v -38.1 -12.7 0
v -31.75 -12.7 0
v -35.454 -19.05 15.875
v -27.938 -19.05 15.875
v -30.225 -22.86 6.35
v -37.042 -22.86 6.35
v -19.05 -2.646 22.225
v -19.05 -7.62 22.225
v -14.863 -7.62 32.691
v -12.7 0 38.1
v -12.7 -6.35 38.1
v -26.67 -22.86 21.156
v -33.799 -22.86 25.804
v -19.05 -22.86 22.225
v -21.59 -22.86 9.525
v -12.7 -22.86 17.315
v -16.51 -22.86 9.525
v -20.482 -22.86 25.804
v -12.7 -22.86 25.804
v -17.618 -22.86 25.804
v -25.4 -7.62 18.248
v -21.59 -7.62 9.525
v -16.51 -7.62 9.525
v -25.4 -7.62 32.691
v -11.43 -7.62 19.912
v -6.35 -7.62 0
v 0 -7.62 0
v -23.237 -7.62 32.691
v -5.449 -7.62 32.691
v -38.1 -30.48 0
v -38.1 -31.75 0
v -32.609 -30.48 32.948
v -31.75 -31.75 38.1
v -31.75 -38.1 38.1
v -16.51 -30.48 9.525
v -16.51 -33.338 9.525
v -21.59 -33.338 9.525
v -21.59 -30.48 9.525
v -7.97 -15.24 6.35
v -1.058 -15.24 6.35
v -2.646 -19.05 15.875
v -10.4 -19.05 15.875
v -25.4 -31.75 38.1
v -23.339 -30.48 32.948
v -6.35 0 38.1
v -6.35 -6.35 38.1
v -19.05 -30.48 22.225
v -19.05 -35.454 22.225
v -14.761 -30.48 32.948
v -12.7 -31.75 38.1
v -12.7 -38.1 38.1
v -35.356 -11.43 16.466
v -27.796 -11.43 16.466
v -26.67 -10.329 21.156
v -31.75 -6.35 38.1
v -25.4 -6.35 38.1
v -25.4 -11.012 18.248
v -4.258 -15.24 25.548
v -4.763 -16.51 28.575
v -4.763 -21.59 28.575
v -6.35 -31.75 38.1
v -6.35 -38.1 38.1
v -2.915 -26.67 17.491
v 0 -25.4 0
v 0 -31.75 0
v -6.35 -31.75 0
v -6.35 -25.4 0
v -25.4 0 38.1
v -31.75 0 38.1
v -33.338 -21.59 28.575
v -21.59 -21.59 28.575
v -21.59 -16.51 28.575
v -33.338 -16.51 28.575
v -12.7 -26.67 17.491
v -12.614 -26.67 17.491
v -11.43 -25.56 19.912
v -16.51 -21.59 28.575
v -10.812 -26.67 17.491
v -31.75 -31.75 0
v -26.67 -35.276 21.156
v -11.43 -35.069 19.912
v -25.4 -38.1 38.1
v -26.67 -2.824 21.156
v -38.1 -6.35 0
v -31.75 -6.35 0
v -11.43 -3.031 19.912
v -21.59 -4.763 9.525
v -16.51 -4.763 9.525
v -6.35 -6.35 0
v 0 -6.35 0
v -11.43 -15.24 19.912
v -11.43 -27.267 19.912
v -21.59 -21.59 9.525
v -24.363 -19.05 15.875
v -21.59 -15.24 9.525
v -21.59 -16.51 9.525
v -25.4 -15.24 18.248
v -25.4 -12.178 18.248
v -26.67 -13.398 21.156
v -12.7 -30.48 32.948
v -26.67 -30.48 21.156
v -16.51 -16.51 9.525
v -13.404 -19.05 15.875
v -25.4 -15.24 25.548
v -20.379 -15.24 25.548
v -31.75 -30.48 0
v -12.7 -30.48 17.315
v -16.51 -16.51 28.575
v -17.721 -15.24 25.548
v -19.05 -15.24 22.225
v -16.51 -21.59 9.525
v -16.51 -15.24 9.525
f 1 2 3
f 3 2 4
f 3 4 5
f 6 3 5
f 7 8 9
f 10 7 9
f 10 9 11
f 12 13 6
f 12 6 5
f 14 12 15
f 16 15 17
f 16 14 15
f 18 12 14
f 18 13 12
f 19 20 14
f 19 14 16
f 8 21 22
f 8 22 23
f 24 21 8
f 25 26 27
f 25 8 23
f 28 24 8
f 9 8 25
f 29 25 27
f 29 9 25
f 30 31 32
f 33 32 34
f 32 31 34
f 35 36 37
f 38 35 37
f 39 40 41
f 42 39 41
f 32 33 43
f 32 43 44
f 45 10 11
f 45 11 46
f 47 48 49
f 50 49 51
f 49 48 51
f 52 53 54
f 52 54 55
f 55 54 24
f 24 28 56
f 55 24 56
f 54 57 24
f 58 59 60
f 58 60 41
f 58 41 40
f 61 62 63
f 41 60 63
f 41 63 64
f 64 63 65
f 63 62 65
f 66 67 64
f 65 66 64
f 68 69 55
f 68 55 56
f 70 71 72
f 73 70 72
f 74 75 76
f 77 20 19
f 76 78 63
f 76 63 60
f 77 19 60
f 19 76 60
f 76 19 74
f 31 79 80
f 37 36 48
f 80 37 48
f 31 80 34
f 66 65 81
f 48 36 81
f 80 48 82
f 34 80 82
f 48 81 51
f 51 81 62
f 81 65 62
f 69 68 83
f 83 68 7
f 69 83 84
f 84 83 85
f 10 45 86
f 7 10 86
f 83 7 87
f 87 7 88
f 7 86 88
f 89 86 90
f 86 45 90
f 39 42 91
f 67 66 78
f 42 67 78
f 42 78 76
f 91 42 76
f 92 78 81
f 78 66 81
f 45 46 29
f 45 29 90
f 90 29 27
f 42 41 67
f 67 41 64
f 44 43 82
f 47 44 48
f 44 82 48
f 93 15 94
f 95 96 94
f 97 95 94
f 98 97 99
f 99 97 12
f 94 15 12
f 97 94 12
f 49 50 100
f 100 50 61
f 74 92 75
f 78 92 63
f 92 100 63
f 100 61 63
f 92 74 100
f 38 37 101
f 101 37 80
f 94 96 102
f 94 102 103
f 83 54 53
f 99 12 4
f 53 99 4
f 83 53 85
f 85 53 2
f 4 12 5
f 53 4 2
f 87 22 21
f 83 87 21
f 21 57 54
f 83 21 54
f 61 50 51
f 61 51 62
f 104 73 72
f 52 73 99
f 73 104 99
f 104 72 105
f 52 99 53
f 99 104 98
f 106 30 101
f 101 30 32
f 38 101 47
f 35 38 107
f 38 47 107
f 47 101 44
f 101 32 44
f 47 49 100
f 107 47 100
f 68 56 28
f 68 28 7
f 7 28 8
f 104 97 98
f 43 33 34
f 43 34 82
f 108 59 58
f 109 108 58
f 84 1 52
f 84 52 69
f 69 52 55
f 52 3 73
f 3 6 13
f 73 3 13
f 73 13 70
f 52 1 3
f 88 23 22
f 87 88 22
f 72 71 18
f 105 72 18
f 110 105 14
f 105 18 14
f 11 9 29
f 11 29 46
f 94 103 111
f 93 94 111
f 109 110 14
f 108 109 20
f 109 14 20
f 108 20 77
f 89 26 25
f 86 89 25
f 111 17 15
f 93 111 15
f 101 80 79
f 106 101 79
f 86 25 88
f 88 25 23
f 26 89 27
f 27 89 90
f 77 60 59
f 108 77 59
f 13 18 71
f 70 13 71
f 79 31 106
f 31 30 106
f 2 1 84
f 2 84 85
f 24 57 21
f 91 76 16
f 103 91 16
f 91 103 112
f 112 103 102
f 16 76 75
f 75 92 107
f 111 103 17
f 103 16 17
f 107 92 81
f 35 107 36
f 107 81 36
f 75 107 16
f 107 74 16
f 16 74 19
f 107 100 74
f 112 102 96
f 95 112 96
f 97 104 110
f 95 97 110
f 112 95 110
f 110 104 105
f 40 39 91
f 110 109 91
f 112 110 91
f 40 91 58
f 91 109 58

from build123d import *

# Parameters (mm, degrees)
F0_W      = 38.1
F0_H      = 38.1
F1_DEPTH  = 38.1
F6_DEPTH  = 76.2
F8_DEPTH  = 38.1
F9_W      = 25.4
F9_H      = 7.62
F10_DEPTH = 38.1


with BuildPart() as f1:
    # F0 (on Front) → F1 (new body)
    with BuildSketch(Plane.XZ):
        with Locations((-19.05, 19.05)):
            Rectangle(F0_W, F0_H)
    extrude(amount=F1_DEPTH)

    # F5 (on offset) → F6 (cut)
    with BuildSketch(Plane.YZ.offset(38.1)):
        Polygon((-11.43, 16.465984), (-6.35, 38.1), (-31.75, 38.1), (-26.67, 17.490659), (-21.59, 28.575), (-16.51, 28.575), align=None)
        Polygon((-25.4, 0), (-12.7, 0), (-19.05, 15.875), align=None)
        Polygon((-6.35, 0), (0, 0), (0, 38.1), align=None)
        Polygon((-38.1, 0), (-31.75, 0), (-38.1, 38.1), align=None)
    extrude(amount=-F6_DEPTH, mode=Mode.SUBTRACT)

    # F7 (on offset) → F8 (cut)
    with BuildSketch(Plane.XZ.offset(38.1)):
        Polygon((-38.1, 38.1), (-38.1, 0), (-31.75, 38.1), align=None)
        Polygon((-19.05, 22.225), (-12.7, 38.1), (-25.4, 38.1), align=None)
        Polygon((-6.35, 38.1), (0, 0), (0, 38.1), align=None)
        Polygon((-31.75, 0), (-6.35, 0), (-11.43, 19.911673), (-16.51, 9.525), (-21.59, 9.525), (-26.67, 21.155922), align=None)
    extrude(amount=-F8_DEPTH, mode=Mode.SUBTRACT)

    # F9 (on offset) → F10 (cut)
    with BuildSketch(Plane.XY.offset(38.1)):
        with Locations((-12.7, -11.43)):
            Rectangle(F9_W, F9_H)
        with Locations((-25.4, -26.67)):
            Rectangle(F9_W, F9_H)
    extrude(amount=-F10_DEPTH, mode=Mode.SUBTRACT)


solid = f1.part
